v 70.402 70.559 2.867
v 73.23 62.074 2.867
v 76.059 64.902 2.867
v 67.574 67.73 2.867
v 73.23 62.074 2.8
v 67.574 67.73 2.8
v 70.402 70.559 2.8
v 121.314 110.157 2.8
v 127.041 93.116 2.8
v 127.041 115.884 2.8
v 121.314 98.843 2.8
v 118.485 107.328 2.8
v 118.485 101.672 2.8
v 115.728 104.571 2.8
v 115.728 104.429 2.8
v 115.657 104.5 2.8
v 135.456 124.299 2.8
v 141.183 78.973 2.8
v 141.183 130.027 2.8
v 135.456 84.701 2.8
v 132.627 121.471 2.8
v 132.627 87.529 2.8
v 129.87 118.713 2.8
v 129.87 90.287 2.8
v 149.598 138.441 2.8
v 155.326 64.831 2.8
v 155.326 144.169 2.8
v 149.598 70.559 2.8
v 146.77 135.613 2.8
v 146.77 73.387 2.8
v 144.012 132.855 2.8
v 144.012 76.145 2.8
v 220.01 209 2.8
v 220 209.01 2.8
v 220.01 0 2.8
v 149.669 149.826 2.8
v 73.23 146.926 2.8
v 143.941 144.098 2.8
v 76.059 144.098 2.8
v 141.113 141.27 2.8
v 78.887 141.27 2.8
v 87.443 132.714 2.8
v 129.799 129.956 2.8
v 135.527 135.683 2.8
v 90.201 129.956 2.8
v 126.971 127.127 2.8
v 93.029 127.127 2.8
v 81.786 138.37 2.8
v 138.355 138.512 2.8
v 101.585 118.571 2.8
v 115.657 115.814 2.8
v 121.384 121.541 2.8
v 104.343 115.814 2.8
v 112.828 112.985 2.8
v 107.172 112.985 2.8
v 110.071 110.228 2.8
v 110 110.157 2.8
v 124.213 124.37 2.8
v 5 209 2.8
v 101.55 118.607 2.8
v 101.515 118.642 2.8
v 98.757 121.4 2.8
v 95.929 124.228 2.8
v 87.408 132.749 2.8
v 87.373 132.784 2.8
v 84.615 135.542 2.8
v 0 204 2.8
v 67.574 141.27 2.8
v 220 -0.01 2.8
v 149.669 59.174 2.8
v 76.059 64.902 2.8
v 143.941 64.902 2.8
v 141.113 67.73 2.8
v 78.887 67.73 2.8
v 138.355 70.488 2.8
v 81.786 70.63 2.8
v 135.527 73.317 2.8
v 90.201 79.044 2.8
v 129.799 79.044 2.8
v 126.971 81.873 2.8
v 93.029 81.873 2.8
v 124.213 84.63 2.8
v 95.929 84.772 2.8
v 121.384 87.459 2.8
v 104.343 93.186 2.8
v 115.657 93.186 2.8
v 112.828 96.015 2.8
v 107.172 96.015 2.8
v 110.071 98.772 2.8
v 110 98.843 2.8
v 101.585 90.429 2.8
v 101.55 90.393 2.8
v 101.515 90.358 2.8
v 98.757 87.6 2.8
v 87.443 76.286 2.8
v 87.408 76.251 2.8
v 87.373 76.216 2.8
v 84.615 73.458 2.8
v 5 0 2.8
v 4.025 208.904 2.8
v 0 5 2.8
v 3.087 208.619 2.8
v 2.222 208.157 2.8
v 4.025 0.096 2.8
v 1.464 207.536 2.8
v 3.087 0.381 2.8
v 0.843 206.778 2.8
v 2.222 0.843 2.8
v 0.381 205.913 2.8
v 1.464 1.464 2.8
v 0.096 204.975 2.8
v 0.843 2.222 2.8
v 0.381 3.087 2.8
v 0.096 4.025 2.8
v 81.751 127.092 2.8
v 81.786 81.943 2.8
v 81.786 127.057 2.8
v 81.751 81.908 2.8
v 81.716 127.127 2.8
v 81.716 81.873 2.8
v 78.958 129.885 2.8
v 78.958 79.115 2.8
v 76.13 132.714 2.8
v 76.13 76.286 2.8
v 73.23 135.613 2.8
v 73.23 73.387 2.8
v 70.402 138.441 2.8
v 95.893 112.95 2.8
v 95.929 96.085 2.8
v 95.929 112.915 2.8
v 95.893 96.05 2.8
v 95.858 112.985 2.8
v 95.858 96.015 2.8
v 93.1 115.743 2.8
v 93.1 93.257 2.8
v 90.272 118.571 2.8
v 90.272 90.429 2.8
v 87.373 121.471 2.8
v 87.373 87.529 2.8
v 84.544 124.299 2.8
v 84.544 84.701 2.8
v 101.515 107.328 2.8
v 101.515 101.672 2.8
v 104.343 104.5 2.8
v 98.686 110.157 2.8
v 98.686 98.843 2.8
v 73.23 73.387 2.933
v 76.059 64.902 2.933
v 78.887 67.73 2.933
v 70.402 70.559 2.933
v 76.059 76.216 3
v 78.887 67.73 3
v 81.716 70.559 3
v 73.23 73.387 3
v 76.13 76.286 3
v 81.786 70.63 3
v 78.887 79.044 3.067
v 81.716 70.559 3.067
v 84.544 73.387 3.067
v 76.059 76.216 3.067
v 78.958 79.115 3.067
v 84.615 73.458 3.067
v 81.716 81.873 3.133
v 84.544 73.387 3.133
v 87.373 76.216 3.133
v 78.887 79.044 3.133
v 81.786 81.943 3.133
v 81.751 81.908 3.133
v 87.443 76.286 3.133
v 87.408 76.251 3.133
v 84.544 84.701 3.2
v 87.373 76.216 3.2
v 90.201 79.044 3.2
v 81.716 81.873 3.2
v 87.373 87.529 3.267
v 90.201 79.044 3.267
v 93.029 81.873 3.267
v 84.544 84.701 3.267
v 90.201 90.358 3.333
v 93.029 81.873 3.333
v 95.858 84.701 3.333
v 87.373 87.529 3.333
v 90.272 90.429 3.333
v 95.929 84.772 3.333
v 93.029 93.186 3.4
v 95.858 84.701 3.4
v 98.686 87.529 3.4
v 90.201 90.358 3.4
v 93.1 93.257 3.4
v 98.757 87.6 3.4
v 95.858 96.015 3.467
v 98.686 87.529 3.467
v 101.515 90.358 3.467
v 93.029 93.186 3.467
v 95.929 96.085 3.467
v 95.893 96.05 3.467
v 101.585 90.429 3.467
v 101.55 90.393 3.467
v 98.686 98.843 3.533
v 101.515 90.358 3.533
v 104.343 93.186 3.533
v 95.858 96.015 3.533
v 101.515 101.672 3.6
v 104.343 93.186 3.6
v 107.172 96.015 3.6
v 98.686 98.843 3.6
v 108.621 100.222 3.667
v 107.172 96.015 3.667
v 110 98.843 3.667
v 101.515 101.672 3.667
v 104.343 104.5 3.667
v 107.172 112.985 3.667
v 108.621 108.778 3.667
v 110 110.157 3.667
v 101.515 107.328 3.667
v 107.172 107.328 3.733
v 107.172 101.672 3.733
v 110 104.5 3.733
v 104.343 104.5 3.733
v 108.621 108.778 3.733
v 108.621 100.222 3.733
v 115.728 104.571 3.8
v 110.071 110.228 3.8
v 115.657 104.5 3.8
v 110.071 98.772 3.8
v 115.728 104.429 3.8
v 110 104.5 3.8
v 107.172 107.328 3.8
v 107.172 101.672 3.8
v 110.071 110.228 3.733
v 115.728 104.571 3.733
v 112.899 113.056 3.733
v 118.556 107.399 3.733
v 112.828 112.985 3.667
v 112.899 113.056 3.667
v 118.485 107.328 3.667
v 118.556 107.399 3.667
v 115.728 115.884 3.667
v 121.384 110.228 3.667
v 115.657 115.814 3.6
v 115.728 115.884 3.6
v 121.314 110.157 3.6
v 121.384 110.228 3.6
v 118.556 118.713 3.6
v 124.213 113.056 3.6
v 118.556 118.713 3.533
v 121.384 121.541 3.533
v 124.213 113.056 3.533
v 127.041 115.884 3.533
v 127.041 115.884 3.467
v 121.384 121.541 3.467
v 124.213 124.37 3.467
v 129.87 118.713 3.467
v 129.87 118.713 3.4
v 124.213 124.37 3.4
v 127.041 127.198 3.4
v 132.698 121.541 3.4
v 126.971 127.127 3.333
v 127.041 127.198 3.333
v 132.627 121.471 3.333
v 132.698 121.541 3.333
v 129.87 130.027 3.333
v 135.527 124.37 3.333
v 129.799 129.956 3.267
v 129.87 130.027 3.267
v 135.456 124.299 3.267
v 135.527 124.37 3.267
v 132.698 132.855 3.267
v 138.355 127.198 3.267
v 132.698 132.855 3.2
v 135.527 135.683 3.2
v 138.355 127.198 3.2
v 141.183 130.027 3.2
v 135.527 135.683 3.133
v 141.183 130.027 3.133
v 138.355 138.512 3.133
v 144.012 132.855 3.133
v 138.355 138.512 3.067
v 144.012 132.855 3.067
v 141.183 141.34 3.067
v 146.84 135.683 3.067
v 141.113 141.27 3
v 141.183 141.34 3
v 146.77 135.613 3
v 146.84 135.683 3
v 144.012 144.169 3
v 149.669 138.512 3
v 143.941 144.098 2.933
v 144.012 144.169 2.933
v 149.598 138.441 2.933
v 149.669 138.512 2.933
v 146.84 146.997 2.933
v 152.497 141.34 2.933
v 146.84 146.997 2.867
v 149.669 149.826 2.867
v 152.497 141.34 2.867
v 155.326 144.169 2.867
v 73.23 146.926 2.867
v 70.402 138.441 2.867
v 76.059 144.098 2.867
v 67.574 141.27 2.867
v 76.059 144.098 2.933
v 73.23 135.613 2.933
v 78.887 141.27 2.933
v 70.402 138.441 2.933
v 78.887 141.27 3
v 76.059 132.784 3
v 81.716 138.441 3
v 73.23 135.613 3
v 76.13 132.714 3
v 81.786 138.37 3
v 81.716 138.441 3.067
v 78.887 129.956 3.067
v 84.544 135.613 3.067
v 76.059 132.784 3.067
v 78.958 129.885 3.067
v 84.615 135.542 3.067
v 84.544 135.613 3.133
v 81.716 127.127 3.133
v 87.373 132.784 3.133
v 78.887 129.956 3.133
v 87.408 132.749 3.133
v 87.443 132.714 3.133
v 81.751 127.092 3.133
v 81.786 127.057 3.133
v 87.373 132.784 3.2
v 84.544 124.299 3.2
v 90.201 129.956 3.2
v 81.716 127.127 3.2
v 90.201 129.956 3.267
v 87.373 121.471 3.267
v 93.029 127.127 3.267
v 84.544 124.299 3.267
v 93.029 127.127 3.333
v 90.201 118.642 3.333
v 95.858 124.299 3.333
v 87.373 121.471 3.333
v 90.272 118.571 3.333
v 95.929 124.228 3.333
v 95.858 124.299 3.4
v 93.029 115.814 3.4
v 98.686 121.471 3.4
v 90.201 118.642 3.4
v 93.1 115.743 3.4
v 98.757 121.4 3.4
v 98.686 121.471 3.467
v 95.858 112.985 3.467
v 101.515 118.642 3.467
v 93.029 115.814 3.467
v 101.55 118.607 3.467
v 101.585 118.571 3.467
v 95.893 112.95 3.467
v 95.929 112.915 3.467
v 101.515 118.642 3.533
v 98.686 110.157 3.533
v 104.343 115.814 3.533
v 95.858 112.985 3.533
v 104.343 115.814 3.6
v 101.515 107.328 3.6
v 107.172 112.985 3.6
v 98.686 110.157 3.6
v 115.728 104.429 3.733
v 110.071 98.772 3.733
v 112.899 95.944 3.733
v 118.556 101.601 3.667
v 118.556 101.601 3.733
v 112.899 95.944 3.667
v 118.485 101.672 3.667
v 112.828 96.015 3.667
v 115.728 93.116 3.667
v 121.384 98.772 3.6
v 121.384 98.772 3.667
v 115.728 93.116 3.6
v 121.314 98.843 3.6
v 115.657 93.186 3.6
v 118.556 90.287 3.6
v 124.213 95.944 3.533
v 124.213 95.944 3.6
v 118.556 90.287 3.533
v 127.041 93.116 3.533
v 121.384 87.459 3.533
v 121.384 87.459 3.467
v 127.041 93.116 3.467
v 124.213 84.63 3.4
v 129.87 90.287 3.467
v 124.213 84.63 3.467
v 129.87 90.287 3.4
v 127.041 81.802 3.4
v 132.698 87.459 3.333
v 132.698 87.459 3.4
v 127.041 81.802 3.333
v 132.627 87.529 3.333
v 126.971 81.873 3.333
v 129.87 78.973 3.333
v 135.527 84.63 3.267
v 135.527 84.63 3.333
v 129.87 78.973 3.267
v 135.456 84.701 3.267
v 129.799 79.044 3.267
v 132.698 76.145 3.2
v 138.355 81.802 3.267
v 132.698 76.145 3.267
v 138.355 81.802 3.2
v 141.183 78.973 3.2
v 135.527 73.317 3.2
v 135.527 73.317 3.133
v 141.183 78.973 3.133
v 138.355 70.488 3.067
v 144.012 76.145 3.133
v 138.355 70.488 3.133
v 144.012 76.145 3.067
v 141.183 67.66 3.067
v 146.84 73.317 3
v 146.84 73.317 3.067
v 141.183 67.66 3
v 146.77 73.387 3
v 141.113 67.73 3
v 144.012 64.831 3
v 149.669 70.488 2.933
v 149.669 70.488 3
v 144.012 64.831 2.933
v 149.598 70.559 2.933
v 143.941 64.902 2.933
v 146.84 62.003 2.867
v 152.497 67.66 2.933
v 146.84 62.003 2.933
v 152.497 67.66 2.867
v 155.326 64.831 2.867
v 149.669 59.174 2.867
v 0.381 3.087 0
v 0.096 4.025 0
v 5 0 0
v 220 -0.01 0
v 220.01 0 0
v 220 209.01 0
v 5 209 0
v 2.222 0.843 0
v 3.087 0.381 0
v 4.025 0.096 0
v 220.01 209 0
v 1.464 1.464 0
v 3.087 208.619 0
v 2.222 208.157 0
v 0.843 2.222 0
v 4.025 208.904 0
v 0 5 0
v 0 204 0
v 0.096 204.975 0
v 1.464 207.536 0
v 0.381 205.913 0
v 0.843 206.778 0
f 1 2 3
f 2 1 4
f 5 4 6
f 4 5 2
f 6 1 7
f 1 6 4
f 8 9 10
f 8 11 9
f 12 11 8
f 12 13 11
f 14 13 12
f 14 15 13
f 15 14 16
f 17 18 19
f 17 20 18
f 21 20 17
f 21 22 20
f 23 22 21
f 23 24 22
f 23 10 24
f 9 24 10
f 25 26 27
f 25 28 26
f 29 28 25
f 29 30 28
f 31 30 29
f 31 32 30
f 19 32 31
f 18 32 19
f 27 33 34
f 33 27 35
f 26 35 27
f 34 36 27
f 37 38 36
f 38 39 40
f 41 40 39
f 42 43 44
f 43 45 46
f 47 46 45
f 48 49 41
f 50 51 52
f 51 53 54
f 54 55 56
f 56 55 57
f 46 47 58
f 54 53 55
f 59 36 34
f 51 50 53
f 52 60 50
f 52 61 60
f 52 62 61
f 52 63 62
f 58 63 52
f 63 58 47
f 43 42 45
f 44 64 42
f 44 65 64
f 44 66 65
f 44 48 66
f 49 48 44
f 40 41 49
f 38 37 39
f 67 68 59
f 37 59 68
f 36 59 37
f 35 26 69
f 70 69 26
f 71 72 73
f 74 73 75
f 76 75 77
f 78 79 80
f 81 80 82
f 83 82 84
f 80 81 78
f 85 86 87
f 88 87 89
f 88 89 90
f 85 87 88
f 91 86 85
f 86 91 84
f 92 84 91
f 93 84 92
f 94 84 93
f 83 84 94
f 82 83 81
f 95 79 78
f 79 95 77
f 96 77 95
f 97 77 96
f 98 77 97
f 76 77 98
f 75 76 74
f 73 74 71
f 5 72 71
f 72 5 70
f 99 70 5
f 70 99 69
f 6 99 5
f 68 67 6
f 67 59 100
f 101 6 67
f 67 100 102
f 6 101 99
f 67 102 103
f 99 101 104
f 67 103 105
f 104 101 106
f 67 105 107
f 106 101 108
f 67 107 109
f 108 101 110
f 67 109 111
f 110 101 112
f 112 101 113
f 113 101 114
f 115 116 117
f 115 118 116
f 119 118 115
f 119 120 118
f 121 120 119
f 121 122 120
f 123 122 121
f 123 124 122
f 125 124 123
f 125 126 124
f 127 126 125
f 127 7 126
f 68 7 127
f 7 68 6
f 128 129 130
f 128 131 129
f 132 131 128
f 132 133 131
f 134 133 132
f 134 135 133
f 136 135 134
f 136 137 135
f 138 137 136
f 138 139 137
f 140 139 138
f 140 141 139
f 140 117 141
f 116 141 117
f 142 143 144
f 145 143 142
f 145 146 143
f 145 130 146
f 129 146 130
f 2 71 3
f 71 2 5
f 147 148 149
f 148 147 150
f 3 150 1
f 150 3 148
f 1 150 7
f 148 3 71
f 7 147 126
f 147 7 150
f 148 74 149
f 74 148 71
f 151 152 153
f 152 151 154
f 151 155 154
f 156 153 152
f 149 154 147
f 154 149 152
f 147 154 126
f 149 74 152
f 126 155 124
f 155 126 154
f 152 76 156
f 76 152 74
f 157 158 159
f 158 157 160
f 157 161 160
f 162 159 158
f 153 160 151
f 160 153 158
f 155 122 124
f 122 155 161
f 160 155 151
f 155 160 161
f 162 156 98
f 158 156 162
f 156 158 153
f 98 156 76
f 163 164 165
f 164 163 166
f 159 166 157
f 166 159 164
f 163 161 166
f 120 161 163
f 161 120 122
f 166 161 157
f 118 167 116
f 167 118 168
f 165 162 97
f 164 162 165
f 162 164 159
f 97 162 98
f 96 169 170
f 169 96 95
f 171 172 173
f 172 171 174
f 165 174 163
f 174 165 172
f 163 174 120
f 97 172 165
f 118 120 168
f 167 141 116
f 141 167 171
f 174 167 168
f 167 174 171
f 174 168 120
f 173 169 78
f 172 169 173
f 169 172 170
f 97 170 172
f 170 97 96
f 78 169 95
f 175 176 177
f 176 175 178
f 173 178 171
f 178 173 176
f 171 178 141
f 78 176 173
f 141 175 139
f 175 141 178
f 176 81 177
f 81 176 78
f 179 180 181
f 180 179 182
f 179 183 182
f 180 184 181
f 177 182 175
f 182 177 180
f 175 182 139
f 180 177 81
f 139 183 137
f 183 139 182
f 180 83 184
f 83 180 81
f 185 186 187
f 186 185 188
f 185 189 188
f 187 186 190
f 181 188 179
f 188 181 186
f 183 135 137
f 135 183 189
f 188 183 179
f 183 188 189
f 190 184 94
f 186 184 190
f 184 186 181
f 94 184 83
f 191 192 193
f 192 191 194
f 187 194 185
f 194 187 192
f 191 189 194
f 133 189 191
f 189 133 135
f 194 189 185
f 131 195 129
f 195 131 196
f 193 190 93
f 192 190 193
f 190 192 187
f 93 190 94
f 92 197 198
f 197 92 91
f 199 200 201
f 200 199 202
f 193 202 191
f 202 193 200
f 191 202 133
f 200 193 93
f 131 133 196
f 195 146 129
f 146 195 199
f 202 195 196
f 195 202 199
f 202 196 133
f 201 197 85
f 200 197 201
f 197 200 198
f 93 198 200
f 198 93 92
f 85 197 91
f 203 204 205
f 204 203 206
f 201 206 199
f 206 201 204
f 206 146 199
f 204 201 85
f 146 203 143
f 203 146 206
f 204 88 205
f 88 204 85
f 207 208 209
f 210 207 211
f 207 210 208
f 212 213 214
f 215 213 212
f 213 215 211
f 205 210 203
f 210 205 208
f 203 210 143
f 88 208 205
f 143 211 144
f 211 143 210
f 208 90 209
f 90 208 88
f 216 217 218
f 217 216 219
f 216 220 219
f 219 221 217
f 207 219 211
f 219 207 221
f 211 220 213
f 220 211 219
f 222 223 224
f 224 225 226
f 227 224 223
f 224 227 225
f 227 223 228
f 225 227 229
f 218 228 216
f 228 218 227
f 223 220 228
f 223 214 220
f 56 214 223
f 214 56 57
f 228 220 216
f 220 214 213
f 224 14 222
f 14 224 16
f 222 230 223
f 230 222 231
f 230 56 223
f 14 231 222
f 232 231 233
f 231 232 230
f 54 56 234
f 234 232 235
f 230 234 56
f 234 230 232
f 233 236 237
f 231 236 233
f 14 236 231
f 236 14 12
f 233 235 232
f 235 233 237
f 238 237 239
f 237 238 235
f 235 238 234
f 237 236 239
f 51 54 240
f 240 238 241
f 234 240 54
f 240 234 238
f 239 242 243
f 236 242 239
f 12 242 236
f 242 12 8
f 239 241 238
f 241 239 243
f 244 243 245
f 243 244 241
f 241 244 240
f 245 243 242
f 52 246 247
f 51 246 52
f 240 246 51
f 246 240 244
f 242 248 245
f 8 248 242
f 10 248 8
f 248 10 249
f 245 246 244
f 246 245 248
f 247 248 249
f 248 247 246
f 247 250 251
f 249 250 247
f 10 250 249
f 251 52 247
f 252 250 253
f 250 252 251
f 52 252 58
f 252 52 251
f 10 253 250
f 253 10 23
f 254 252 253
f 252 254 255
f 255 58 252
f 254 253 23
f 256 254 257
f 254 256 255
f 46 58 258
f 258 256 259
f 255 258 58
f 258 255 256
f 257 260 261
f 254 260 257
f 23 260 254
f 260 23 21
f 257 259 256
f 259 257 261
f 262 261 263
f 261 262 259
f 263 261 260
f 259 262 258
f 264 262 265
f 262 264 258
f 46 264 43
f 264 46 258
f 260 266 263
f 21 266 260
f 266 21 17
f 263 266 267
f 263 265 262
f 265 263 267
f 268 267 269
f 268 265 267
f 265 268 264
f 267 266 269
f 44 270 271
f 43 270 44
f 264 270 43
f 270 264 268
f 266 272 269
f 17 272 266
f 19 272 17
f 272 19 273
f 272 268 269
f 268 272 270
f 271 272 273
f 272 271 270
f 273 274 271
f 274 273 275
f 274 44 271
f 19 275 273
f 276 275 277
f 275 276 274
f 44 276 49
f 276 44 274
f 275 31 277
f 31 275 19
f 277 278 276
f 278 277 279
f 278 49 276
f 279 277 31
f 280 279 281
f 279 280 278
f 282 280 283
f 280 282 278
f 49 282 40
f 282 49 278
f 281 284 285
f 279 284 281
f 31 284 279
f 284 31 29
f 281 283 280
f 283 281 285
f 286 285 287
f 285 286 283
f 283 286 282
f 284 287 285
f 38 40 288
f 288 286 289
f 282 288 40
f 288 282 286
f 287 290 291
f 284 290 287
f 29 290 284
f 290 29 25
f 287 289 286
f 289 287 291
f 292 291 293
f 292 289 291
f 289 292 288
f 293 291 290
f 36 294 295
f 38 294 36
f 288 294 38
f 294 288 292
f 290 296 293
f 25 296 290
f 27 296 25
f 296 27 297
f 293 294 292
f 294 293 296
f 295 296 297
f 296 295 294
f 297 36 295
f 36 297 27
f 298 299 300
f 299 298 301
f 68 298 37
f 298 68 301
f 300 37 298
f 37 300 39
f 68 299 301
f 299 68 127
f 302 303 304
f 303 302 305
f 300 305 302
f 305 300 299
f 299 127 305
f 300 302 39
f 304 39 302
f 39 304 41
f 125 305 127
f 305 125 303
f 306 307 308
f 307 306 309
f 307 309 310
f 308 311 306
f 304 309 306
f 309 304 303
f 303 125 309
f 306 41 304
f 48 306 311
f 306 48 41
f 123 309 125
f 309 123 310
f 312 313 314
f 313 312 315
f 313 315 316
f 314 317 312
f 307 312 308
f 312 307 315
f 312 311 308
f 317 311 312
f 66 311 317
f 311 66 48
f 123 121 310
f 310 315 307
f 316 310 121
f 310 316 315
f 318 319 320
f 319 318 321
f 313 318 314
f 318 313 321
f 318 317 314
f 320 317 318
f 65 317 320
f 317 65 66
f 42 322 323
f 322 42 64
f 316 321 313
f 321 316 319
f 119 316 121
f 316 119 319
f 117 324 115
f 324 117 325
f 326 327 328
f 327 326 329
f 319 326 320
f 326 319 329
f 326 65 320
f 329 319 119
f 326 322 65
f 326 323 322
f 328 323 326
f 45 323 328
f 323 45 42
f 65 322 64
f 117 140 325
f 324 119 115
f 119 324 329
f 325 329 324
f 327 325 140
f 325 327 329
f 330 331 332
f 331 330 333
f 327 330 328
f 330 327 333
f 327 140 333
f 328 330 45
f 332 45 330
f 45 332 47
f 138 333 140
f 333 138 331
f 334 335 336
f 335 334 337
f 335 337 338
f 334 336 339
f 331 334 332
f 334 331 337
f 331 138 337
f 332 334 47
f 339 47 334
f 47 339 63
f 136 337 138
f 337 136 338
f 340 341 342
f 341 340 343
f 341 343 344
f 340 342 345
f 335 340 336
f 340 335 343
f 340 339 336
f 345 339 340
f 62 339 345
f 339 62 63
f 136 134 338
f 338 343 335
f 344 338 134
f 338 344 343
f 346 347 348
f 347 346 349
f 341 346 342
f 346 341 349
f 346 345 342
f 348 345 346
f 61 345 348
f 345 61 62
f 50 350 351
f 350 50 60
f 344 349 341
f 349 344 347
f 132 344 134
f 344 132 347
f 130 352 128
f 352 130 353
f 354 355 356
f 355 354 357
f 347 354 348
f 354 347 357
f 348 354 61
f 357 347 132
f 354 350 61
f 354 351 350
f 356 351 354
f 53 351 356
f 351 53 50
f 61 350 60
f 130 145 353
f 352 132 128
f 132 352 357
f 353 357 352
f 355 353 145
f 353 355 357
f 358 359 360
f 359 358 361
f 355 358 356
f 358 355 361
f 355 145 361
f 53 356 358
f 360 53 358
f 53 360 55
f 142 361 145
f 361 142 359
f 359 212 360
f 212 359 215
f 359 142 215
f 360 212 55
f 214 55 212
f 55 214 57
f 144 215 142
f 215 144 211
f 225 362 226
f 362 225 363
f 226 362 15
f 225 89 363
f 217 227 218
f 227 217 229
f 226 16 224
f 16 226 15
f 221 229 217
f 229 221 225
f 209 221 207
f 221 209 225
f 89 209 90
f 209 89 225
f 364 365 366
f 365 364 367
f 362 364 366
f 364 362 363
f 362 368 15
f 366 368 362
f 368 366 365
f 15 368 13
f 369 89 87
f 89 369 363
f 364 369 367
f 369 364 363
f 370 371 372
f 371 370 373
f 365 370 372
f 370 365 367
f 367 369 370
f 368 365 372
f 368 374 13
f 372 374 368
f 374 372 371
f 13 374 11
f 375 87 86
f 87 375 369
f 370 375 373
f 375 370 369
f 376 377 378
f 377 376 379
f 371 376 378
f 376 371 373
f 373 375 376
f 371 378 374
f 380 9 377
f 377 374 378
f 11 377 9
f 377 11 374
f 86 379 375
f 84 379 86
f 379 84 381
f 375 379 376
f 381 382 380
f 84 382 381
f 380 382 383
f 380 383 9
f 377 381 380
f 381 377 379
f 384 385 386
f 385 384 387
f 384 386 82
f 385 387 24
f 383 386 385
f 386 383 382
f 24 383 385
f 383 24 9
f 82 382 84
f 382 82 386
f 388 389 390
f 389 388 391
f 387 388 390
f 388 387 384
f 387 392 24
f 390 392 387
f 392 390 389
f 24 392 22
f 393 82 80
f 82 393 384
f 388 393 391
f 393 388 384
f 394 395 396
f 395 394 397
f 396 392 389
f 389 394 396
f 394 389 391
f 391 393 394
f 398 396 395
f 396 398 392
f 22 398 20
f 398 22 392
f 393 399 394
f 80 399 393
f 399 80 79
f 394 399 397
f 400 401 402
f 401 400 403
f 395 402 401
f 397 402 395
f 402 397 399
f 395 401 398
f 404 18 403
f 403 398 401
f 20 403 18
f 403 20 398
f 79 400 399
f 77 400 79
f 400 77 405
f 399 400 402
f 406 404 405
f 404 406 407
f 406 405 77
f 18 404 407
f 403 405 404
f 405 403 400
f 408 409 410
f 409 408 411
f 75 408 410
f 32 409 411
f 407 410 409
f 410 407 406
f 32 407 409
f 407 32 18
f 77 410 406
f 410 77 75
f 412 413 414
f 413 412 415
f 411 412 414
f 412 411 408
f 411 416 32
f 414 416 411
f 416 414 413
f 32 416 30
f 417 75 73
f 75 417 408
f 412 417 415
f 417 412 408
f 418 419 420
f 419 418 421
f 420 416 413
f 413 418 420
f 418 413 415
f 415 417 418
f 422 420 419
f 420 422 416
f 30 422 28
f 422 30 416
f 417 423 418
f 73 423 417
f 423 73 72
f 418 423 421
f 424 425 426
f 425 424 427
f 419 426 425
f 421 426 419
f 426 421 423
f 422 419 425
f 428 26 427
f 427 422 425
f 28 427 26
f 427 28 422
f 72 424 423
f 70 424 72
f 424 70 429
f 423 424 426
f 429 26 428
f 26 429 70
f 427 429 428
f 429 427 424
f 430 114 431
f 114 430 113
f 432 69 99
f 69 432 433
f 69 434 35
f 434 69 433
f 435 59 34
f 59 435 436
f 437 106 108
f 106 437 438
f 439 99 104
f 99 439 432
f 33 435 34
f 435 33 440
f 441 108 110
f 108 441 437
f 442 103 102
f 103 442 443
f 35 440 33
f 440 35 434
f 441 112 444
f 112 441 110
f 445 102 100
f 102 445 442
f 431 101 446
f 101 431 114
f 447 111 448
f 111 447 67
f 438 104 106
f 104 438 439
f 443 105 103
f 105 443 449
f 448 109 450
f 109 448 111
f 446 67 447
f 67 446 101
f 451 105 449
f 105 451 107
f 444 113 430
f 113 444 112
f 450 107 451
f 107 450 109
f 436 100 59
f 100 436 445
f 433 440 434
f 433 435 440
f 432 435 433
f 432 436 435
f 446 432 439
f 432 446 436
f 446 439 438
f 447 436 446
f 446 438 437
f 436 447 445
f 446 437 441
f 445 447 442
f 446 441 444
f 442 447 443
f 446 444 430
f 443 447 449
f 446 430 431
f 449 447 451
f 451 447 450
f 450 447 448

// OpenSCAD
// 滑槽拼接 - 对角线方向
// A部分：220mm × 209mm × 2.8mm
// 滑槽：右上向左下

// 参数
width = 220;     // 宽度 (mm)
height = 209;    // 高度 (mm)
thickness = 2.8; // 厚度 (mm)
corner_radius = 5;  // 倒角半径 (mm)

// 滑槽参数
slot_depth = 3;       // 槽深度 (mm)
slot_height = 3;      // 槽高度 (mm)
slot_length = 180;    // 槽长度 (mm) - 对角线
slot_offset_x = 10;   // 槽起点X偏移
slot_offset_y = 20;   // 槽起点Y偏移
slot_angle = 30;       // 槽对角线角度（度）

// X 图案参数
x_max_height = 1.0;
x_width = 8;
x_diagonal = 120;

// 圆角矩形模块（右侧不倒角）
module rounded_rect_right_flat(w, h, r, t) {
    hull() {
        translate([r, r, 0]) cylinder(h = t, r = r, $fn = 32);
        translate([r, h - r, 0]) cylinder(h = t, r = r, $fn = 32);
        translate([w, h, 0]) cylinder(h = t, r = 0.01, $fn = 4);
        translate([w, 0, 0]) cylinder(h = t, r = 0.01, $fn = 4);
    }
}

// 创建主体
difference() {
    union() {
        // 面板主体
        color("LightGray") {
            rounded_rect_right_flat(width, height, corner_radius, thickness);
        }

        // X 图案
        color("DarkGray") {
            translate([width/2, height/2, 0])
            x_pattern();
        }
    }

    // 对角线滑槽（右上向左下）
    color("Red") {
        translate([width - 0.1, slot_offset_y, -0.1])
        rotate([0, 0, -slot_angle])
        translate([slot_depth, 0, 0])
        cube([slot_depth + 0.2, slot_length, slot_height + 0.2]);
    }
}

// X 图案模块
module x_pattern() {
    segments = 30;
    segment_length = x_diagonal / segments;

    union() {
        for (i = [-segments/2:segments/2-1]) {
            dist_ratio = abs(i) / (segments/2);
            current_height = x_max_height * (1 - dist_ratio);

            translate([0, 0, thickness])
            rotate([0, 0, 45])
            translate([i * segment_length, -x_width/2, 0])
            cube([segment_length + 0.1, x_width, current_height]);
        }

        for (i = [-segments/2:segments/2-1]) {
            dist_ratio = abs(i) / (segments/2);
            current_height = x_max_height * (1 - dist_ratio);

            translate([0, 0, thickness])
            rotate([0, 0, -45])
            translate([i * segment_length, -x_width/2, 0])
            cube([segment_length + 0.1, x_width, current_height]);
        }
    }
}
